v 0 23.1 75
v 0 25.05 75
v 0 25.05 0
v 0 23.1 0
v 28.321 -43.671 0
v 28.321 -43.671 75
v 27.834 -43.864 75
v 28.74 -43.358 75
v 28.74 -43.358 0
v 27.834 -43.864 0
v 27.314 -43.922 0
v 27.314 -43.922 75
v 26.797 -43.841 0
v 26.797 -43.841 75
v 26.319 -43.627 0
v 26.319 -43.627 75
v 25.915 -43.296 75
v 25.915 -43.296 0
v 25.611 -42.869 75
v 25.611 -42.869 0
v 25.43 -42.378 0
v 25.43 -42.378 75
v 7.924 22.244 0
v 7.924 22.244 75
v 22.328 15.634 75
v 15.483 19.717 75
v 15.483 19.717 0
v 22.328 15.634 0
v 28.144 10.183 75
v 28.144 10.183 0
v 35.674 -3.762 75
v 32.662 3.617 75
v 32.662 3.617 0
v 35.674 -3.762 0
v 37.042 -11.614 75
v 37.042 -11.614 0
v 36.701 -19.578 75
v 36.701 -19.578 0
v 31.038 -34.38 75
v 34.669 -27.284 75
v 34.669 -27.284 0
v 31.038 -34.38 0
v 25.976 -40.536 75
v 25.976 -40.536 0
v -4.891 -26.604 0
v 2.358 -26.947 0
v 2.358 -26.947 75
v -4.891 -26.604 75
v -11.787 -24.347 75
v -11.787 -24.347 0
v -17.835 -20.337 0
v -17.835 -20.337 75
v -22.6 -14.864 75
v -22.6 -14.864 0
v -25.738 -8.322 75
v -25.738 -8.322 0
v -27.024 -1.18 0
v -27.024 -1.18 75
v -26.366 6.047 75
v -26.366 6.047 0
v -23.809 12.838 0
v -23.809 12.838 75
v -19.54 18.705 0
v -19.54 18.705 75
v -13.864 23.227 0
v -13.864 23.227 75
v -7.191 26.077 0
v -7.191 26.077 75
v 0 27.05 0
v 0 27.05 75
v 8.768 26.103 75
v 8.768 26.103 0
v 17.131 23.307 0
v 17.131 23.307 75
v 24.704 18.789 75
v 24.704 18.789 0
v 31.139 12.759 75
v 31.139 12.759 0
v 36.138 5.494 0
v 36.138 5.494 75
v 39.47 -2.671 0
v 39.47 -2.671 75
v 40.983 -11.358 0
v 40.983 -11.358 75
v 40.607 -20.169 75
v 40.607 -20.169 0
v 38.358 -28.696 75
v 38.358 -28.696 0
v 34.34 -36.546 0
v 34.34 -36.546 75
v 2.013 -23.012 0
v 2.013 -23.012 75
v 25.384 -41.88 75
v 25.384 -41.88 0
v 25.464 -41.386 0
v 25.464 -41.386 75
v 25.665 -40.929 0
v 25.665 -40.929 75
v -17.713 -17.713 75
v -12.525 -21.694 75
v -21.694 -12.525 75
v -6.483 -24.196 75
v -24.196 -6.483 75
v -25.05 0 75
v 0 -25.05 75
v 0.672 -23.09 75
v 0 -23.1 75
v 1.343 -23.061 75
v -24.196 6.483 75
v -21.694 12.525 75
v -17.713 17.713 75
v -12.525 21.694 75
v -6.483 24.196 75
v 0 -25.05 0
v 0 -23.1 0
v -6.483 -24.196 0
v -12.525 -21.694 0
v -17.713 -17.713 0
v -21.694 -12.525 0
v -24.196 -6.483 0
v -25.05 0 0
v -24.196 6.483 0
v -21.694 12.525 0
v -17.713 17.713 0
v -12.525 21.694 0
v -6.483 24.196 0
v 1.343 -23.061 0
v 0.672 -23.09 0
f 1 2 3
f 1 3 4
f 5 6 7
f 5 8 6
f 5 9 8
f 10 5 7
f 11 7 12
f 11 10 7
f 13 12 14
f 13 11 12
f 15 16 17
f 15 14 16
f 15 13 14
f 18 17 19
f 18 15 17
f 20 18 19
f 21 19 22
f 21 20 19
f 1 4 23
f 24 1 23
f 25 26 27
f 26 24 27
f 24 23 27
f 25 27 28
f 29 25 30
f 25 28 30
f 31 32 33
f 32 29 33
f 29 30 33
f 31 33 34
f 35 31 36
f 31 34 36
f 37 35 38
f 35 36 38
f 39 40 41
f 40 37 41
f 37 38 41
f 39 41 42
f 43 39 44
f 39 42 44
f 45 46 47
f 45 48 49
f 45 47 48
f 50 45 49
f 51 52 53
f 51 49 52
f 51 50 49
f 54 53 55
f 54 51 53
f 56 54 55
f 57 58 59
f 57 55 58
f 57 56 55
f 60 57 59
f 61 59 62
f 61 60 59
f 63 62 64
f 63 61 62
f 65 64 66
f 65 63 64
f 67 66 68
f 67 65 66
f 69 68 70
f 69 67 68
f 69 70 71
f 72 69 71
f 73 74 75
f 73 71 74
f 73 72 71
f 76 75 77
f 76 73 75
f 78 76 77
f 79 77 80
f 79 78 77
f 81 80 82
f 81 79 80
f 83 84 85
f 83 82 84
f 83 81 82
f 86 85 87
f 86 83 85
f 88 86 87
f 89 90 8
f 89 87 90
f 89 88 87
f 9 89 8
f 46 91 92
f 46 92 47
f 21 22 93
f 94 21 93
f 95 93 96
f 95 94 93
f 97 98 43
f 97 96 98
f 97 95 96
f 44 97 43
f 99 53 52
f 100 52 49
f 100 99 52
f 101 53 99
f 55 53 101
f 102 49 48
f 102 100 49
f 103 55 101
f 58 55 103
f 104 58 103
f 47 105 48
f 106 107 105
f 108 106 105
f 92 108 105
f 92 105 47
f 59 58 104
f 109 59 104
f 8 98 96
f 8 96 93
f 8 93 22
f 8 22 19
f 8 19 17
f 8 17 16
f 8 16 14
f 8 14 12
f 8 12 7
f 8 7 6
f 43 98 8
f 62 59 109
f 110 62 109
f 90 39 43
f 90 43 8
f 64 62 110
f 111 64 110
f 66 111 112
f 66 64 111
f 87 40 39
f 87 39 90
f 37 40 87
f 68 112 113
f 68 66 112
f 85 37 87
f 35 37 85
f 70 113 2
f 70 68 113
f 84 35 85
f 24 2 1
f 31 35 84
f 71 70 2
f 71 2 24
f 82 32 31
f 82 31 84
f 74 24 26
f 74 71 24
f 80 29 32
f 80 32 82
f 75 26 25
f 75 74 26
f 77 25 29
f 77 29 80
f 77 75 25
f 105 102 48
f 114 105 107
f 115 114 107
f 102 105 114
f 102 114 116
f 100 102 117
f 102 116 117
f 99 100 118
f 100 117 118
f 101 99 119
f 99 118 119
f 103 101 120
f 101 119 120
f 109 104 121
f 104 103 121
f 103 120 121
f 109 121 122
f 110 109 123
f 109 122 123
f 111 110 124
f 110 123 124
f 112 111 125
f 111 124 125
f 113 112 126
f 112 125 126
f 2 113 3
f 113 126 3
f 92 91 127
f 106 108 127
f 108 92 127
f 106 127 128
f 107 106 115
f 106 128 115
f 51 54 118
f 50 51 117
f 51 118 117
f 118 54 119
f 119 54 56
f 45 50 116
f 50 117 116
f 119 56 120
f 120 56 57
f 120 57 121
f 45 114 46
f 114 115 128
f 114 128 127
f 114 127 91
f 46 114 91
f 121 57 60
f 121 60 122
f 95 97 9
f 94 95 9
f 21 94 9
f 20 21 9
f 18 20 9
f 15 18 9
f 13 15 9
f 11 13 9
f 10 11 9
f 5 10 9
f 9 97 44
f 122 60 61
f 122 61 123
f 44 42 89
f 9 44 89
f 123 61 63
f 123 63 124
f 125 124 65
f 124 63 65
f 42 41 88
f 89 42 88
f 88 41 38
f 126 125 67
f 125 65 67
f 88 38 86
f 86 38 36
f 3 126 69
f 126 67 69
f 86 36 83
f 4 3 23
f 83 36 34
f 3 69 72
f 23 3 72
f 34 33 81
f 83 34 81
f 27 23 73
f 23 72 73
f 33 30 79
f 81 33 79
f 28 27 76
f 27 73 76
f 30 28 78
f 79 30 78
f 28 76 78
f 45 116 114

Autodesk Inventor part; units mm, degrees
ref_plane "YZ Plane" through (0, 0, 0) normal (1, 0, 0) x (0, 1, 0)
ref_plane "XZ Plane" through (0, 0, 0) normal (0, 1, 0) x (-1, 0, 0)
ref_plane "XY Plane" through (0, 0, 0) normal (0, 0, 1) x (1, 0, 0)
sketch "Skizze1" plane through (0, 0, 0) normal (0, 0, 1) x (1, 0, 0)
  circle A0 centre (0, 0) radius 25.05 construction
  arc A1 (28.7396, -43.3579) -> (0, 27.05) centre (0, -14.0195) ccw
  circle A2 centre (0, 0) radius 23.1 construction
  line L0 (0, 25.05) -> (0, 23.1)
  arc A3 (25.9755, -40.5362) -> (0, 23.1) centre (0, -14.0195) ccw
  line L1 (0, -63.4548) -> (0, 53.3986) construction
  line L2 (0, -25.05) -> (0, -23.1)
  line L3 (2.0133, -23.0121) -> (2.3576, -26.9471)
  arc A4 (0, 27.05) -> (2.3576, -26.9471) centre (0, 0) ccw
  arc A5 (0, -23.1) -> (2.0133, -23.0121) centre (0, 0) ccw
  arc A6 (0, 25.05) -> (0, -25.05) centre (0, 0) ccw
  arc A7 (25.9755, -40.5362) -> (28.7396, -43.3579) centre (27.3576, -41.9471) ccw
  arc A8 (3.0076, -22.9034) -> (0, 23.1) centre (0, 0) ccw
  line L4 (3.0076, -22.9034) -> (3.3521, -26.8415)
  circle A9 centre (0, 0) radius 27.05 construction
  arc A10 (25.4302, -42.3783) -> (3.3521, -26.8415) centre (5.8399, -46.7614) ccw
  dimension "d0" = 50.1
  dimension "d2" = 46.2
  dimension "d3" = 2
  dimension "d4" = 5
  dimension "d11" = 25
  dimension "d12" = 15
  dimension "d16" = 1
extrude "Extrusion1" add sketch "Skizze1" along normal blind 75 contours A7 A3 L0 A6 L2 A5 L3 A4 A1
equation "\"d0\" = ht_diameter + gap_fit"
equation "\"d2\" = ht_diameter - 2 * ht_thickness"
equation "\"kg_thickness\" = 4.9"
equation "\"ht_diameter\" = 50"
equation "\"ht_thickness\" = 1.9"
equation "\"case_thickness\" = 18"
equation "\"gap_fit\" = 0.1"
equation "\"gap_slide\" = 0.2"
equation "\"gap_air\" = 1"
equation "\"bore_diameter\" = 73"
equation "\"tape_thickness\" = 3"
equation "\"tape_width\" = 15"
equation "\"mdf_thickness\" = 6"
equation "\"inner_thickness\" = 15"
equation "\"inner_depth\" = 255"
properties part number "Züklon_Lufteinlass"
